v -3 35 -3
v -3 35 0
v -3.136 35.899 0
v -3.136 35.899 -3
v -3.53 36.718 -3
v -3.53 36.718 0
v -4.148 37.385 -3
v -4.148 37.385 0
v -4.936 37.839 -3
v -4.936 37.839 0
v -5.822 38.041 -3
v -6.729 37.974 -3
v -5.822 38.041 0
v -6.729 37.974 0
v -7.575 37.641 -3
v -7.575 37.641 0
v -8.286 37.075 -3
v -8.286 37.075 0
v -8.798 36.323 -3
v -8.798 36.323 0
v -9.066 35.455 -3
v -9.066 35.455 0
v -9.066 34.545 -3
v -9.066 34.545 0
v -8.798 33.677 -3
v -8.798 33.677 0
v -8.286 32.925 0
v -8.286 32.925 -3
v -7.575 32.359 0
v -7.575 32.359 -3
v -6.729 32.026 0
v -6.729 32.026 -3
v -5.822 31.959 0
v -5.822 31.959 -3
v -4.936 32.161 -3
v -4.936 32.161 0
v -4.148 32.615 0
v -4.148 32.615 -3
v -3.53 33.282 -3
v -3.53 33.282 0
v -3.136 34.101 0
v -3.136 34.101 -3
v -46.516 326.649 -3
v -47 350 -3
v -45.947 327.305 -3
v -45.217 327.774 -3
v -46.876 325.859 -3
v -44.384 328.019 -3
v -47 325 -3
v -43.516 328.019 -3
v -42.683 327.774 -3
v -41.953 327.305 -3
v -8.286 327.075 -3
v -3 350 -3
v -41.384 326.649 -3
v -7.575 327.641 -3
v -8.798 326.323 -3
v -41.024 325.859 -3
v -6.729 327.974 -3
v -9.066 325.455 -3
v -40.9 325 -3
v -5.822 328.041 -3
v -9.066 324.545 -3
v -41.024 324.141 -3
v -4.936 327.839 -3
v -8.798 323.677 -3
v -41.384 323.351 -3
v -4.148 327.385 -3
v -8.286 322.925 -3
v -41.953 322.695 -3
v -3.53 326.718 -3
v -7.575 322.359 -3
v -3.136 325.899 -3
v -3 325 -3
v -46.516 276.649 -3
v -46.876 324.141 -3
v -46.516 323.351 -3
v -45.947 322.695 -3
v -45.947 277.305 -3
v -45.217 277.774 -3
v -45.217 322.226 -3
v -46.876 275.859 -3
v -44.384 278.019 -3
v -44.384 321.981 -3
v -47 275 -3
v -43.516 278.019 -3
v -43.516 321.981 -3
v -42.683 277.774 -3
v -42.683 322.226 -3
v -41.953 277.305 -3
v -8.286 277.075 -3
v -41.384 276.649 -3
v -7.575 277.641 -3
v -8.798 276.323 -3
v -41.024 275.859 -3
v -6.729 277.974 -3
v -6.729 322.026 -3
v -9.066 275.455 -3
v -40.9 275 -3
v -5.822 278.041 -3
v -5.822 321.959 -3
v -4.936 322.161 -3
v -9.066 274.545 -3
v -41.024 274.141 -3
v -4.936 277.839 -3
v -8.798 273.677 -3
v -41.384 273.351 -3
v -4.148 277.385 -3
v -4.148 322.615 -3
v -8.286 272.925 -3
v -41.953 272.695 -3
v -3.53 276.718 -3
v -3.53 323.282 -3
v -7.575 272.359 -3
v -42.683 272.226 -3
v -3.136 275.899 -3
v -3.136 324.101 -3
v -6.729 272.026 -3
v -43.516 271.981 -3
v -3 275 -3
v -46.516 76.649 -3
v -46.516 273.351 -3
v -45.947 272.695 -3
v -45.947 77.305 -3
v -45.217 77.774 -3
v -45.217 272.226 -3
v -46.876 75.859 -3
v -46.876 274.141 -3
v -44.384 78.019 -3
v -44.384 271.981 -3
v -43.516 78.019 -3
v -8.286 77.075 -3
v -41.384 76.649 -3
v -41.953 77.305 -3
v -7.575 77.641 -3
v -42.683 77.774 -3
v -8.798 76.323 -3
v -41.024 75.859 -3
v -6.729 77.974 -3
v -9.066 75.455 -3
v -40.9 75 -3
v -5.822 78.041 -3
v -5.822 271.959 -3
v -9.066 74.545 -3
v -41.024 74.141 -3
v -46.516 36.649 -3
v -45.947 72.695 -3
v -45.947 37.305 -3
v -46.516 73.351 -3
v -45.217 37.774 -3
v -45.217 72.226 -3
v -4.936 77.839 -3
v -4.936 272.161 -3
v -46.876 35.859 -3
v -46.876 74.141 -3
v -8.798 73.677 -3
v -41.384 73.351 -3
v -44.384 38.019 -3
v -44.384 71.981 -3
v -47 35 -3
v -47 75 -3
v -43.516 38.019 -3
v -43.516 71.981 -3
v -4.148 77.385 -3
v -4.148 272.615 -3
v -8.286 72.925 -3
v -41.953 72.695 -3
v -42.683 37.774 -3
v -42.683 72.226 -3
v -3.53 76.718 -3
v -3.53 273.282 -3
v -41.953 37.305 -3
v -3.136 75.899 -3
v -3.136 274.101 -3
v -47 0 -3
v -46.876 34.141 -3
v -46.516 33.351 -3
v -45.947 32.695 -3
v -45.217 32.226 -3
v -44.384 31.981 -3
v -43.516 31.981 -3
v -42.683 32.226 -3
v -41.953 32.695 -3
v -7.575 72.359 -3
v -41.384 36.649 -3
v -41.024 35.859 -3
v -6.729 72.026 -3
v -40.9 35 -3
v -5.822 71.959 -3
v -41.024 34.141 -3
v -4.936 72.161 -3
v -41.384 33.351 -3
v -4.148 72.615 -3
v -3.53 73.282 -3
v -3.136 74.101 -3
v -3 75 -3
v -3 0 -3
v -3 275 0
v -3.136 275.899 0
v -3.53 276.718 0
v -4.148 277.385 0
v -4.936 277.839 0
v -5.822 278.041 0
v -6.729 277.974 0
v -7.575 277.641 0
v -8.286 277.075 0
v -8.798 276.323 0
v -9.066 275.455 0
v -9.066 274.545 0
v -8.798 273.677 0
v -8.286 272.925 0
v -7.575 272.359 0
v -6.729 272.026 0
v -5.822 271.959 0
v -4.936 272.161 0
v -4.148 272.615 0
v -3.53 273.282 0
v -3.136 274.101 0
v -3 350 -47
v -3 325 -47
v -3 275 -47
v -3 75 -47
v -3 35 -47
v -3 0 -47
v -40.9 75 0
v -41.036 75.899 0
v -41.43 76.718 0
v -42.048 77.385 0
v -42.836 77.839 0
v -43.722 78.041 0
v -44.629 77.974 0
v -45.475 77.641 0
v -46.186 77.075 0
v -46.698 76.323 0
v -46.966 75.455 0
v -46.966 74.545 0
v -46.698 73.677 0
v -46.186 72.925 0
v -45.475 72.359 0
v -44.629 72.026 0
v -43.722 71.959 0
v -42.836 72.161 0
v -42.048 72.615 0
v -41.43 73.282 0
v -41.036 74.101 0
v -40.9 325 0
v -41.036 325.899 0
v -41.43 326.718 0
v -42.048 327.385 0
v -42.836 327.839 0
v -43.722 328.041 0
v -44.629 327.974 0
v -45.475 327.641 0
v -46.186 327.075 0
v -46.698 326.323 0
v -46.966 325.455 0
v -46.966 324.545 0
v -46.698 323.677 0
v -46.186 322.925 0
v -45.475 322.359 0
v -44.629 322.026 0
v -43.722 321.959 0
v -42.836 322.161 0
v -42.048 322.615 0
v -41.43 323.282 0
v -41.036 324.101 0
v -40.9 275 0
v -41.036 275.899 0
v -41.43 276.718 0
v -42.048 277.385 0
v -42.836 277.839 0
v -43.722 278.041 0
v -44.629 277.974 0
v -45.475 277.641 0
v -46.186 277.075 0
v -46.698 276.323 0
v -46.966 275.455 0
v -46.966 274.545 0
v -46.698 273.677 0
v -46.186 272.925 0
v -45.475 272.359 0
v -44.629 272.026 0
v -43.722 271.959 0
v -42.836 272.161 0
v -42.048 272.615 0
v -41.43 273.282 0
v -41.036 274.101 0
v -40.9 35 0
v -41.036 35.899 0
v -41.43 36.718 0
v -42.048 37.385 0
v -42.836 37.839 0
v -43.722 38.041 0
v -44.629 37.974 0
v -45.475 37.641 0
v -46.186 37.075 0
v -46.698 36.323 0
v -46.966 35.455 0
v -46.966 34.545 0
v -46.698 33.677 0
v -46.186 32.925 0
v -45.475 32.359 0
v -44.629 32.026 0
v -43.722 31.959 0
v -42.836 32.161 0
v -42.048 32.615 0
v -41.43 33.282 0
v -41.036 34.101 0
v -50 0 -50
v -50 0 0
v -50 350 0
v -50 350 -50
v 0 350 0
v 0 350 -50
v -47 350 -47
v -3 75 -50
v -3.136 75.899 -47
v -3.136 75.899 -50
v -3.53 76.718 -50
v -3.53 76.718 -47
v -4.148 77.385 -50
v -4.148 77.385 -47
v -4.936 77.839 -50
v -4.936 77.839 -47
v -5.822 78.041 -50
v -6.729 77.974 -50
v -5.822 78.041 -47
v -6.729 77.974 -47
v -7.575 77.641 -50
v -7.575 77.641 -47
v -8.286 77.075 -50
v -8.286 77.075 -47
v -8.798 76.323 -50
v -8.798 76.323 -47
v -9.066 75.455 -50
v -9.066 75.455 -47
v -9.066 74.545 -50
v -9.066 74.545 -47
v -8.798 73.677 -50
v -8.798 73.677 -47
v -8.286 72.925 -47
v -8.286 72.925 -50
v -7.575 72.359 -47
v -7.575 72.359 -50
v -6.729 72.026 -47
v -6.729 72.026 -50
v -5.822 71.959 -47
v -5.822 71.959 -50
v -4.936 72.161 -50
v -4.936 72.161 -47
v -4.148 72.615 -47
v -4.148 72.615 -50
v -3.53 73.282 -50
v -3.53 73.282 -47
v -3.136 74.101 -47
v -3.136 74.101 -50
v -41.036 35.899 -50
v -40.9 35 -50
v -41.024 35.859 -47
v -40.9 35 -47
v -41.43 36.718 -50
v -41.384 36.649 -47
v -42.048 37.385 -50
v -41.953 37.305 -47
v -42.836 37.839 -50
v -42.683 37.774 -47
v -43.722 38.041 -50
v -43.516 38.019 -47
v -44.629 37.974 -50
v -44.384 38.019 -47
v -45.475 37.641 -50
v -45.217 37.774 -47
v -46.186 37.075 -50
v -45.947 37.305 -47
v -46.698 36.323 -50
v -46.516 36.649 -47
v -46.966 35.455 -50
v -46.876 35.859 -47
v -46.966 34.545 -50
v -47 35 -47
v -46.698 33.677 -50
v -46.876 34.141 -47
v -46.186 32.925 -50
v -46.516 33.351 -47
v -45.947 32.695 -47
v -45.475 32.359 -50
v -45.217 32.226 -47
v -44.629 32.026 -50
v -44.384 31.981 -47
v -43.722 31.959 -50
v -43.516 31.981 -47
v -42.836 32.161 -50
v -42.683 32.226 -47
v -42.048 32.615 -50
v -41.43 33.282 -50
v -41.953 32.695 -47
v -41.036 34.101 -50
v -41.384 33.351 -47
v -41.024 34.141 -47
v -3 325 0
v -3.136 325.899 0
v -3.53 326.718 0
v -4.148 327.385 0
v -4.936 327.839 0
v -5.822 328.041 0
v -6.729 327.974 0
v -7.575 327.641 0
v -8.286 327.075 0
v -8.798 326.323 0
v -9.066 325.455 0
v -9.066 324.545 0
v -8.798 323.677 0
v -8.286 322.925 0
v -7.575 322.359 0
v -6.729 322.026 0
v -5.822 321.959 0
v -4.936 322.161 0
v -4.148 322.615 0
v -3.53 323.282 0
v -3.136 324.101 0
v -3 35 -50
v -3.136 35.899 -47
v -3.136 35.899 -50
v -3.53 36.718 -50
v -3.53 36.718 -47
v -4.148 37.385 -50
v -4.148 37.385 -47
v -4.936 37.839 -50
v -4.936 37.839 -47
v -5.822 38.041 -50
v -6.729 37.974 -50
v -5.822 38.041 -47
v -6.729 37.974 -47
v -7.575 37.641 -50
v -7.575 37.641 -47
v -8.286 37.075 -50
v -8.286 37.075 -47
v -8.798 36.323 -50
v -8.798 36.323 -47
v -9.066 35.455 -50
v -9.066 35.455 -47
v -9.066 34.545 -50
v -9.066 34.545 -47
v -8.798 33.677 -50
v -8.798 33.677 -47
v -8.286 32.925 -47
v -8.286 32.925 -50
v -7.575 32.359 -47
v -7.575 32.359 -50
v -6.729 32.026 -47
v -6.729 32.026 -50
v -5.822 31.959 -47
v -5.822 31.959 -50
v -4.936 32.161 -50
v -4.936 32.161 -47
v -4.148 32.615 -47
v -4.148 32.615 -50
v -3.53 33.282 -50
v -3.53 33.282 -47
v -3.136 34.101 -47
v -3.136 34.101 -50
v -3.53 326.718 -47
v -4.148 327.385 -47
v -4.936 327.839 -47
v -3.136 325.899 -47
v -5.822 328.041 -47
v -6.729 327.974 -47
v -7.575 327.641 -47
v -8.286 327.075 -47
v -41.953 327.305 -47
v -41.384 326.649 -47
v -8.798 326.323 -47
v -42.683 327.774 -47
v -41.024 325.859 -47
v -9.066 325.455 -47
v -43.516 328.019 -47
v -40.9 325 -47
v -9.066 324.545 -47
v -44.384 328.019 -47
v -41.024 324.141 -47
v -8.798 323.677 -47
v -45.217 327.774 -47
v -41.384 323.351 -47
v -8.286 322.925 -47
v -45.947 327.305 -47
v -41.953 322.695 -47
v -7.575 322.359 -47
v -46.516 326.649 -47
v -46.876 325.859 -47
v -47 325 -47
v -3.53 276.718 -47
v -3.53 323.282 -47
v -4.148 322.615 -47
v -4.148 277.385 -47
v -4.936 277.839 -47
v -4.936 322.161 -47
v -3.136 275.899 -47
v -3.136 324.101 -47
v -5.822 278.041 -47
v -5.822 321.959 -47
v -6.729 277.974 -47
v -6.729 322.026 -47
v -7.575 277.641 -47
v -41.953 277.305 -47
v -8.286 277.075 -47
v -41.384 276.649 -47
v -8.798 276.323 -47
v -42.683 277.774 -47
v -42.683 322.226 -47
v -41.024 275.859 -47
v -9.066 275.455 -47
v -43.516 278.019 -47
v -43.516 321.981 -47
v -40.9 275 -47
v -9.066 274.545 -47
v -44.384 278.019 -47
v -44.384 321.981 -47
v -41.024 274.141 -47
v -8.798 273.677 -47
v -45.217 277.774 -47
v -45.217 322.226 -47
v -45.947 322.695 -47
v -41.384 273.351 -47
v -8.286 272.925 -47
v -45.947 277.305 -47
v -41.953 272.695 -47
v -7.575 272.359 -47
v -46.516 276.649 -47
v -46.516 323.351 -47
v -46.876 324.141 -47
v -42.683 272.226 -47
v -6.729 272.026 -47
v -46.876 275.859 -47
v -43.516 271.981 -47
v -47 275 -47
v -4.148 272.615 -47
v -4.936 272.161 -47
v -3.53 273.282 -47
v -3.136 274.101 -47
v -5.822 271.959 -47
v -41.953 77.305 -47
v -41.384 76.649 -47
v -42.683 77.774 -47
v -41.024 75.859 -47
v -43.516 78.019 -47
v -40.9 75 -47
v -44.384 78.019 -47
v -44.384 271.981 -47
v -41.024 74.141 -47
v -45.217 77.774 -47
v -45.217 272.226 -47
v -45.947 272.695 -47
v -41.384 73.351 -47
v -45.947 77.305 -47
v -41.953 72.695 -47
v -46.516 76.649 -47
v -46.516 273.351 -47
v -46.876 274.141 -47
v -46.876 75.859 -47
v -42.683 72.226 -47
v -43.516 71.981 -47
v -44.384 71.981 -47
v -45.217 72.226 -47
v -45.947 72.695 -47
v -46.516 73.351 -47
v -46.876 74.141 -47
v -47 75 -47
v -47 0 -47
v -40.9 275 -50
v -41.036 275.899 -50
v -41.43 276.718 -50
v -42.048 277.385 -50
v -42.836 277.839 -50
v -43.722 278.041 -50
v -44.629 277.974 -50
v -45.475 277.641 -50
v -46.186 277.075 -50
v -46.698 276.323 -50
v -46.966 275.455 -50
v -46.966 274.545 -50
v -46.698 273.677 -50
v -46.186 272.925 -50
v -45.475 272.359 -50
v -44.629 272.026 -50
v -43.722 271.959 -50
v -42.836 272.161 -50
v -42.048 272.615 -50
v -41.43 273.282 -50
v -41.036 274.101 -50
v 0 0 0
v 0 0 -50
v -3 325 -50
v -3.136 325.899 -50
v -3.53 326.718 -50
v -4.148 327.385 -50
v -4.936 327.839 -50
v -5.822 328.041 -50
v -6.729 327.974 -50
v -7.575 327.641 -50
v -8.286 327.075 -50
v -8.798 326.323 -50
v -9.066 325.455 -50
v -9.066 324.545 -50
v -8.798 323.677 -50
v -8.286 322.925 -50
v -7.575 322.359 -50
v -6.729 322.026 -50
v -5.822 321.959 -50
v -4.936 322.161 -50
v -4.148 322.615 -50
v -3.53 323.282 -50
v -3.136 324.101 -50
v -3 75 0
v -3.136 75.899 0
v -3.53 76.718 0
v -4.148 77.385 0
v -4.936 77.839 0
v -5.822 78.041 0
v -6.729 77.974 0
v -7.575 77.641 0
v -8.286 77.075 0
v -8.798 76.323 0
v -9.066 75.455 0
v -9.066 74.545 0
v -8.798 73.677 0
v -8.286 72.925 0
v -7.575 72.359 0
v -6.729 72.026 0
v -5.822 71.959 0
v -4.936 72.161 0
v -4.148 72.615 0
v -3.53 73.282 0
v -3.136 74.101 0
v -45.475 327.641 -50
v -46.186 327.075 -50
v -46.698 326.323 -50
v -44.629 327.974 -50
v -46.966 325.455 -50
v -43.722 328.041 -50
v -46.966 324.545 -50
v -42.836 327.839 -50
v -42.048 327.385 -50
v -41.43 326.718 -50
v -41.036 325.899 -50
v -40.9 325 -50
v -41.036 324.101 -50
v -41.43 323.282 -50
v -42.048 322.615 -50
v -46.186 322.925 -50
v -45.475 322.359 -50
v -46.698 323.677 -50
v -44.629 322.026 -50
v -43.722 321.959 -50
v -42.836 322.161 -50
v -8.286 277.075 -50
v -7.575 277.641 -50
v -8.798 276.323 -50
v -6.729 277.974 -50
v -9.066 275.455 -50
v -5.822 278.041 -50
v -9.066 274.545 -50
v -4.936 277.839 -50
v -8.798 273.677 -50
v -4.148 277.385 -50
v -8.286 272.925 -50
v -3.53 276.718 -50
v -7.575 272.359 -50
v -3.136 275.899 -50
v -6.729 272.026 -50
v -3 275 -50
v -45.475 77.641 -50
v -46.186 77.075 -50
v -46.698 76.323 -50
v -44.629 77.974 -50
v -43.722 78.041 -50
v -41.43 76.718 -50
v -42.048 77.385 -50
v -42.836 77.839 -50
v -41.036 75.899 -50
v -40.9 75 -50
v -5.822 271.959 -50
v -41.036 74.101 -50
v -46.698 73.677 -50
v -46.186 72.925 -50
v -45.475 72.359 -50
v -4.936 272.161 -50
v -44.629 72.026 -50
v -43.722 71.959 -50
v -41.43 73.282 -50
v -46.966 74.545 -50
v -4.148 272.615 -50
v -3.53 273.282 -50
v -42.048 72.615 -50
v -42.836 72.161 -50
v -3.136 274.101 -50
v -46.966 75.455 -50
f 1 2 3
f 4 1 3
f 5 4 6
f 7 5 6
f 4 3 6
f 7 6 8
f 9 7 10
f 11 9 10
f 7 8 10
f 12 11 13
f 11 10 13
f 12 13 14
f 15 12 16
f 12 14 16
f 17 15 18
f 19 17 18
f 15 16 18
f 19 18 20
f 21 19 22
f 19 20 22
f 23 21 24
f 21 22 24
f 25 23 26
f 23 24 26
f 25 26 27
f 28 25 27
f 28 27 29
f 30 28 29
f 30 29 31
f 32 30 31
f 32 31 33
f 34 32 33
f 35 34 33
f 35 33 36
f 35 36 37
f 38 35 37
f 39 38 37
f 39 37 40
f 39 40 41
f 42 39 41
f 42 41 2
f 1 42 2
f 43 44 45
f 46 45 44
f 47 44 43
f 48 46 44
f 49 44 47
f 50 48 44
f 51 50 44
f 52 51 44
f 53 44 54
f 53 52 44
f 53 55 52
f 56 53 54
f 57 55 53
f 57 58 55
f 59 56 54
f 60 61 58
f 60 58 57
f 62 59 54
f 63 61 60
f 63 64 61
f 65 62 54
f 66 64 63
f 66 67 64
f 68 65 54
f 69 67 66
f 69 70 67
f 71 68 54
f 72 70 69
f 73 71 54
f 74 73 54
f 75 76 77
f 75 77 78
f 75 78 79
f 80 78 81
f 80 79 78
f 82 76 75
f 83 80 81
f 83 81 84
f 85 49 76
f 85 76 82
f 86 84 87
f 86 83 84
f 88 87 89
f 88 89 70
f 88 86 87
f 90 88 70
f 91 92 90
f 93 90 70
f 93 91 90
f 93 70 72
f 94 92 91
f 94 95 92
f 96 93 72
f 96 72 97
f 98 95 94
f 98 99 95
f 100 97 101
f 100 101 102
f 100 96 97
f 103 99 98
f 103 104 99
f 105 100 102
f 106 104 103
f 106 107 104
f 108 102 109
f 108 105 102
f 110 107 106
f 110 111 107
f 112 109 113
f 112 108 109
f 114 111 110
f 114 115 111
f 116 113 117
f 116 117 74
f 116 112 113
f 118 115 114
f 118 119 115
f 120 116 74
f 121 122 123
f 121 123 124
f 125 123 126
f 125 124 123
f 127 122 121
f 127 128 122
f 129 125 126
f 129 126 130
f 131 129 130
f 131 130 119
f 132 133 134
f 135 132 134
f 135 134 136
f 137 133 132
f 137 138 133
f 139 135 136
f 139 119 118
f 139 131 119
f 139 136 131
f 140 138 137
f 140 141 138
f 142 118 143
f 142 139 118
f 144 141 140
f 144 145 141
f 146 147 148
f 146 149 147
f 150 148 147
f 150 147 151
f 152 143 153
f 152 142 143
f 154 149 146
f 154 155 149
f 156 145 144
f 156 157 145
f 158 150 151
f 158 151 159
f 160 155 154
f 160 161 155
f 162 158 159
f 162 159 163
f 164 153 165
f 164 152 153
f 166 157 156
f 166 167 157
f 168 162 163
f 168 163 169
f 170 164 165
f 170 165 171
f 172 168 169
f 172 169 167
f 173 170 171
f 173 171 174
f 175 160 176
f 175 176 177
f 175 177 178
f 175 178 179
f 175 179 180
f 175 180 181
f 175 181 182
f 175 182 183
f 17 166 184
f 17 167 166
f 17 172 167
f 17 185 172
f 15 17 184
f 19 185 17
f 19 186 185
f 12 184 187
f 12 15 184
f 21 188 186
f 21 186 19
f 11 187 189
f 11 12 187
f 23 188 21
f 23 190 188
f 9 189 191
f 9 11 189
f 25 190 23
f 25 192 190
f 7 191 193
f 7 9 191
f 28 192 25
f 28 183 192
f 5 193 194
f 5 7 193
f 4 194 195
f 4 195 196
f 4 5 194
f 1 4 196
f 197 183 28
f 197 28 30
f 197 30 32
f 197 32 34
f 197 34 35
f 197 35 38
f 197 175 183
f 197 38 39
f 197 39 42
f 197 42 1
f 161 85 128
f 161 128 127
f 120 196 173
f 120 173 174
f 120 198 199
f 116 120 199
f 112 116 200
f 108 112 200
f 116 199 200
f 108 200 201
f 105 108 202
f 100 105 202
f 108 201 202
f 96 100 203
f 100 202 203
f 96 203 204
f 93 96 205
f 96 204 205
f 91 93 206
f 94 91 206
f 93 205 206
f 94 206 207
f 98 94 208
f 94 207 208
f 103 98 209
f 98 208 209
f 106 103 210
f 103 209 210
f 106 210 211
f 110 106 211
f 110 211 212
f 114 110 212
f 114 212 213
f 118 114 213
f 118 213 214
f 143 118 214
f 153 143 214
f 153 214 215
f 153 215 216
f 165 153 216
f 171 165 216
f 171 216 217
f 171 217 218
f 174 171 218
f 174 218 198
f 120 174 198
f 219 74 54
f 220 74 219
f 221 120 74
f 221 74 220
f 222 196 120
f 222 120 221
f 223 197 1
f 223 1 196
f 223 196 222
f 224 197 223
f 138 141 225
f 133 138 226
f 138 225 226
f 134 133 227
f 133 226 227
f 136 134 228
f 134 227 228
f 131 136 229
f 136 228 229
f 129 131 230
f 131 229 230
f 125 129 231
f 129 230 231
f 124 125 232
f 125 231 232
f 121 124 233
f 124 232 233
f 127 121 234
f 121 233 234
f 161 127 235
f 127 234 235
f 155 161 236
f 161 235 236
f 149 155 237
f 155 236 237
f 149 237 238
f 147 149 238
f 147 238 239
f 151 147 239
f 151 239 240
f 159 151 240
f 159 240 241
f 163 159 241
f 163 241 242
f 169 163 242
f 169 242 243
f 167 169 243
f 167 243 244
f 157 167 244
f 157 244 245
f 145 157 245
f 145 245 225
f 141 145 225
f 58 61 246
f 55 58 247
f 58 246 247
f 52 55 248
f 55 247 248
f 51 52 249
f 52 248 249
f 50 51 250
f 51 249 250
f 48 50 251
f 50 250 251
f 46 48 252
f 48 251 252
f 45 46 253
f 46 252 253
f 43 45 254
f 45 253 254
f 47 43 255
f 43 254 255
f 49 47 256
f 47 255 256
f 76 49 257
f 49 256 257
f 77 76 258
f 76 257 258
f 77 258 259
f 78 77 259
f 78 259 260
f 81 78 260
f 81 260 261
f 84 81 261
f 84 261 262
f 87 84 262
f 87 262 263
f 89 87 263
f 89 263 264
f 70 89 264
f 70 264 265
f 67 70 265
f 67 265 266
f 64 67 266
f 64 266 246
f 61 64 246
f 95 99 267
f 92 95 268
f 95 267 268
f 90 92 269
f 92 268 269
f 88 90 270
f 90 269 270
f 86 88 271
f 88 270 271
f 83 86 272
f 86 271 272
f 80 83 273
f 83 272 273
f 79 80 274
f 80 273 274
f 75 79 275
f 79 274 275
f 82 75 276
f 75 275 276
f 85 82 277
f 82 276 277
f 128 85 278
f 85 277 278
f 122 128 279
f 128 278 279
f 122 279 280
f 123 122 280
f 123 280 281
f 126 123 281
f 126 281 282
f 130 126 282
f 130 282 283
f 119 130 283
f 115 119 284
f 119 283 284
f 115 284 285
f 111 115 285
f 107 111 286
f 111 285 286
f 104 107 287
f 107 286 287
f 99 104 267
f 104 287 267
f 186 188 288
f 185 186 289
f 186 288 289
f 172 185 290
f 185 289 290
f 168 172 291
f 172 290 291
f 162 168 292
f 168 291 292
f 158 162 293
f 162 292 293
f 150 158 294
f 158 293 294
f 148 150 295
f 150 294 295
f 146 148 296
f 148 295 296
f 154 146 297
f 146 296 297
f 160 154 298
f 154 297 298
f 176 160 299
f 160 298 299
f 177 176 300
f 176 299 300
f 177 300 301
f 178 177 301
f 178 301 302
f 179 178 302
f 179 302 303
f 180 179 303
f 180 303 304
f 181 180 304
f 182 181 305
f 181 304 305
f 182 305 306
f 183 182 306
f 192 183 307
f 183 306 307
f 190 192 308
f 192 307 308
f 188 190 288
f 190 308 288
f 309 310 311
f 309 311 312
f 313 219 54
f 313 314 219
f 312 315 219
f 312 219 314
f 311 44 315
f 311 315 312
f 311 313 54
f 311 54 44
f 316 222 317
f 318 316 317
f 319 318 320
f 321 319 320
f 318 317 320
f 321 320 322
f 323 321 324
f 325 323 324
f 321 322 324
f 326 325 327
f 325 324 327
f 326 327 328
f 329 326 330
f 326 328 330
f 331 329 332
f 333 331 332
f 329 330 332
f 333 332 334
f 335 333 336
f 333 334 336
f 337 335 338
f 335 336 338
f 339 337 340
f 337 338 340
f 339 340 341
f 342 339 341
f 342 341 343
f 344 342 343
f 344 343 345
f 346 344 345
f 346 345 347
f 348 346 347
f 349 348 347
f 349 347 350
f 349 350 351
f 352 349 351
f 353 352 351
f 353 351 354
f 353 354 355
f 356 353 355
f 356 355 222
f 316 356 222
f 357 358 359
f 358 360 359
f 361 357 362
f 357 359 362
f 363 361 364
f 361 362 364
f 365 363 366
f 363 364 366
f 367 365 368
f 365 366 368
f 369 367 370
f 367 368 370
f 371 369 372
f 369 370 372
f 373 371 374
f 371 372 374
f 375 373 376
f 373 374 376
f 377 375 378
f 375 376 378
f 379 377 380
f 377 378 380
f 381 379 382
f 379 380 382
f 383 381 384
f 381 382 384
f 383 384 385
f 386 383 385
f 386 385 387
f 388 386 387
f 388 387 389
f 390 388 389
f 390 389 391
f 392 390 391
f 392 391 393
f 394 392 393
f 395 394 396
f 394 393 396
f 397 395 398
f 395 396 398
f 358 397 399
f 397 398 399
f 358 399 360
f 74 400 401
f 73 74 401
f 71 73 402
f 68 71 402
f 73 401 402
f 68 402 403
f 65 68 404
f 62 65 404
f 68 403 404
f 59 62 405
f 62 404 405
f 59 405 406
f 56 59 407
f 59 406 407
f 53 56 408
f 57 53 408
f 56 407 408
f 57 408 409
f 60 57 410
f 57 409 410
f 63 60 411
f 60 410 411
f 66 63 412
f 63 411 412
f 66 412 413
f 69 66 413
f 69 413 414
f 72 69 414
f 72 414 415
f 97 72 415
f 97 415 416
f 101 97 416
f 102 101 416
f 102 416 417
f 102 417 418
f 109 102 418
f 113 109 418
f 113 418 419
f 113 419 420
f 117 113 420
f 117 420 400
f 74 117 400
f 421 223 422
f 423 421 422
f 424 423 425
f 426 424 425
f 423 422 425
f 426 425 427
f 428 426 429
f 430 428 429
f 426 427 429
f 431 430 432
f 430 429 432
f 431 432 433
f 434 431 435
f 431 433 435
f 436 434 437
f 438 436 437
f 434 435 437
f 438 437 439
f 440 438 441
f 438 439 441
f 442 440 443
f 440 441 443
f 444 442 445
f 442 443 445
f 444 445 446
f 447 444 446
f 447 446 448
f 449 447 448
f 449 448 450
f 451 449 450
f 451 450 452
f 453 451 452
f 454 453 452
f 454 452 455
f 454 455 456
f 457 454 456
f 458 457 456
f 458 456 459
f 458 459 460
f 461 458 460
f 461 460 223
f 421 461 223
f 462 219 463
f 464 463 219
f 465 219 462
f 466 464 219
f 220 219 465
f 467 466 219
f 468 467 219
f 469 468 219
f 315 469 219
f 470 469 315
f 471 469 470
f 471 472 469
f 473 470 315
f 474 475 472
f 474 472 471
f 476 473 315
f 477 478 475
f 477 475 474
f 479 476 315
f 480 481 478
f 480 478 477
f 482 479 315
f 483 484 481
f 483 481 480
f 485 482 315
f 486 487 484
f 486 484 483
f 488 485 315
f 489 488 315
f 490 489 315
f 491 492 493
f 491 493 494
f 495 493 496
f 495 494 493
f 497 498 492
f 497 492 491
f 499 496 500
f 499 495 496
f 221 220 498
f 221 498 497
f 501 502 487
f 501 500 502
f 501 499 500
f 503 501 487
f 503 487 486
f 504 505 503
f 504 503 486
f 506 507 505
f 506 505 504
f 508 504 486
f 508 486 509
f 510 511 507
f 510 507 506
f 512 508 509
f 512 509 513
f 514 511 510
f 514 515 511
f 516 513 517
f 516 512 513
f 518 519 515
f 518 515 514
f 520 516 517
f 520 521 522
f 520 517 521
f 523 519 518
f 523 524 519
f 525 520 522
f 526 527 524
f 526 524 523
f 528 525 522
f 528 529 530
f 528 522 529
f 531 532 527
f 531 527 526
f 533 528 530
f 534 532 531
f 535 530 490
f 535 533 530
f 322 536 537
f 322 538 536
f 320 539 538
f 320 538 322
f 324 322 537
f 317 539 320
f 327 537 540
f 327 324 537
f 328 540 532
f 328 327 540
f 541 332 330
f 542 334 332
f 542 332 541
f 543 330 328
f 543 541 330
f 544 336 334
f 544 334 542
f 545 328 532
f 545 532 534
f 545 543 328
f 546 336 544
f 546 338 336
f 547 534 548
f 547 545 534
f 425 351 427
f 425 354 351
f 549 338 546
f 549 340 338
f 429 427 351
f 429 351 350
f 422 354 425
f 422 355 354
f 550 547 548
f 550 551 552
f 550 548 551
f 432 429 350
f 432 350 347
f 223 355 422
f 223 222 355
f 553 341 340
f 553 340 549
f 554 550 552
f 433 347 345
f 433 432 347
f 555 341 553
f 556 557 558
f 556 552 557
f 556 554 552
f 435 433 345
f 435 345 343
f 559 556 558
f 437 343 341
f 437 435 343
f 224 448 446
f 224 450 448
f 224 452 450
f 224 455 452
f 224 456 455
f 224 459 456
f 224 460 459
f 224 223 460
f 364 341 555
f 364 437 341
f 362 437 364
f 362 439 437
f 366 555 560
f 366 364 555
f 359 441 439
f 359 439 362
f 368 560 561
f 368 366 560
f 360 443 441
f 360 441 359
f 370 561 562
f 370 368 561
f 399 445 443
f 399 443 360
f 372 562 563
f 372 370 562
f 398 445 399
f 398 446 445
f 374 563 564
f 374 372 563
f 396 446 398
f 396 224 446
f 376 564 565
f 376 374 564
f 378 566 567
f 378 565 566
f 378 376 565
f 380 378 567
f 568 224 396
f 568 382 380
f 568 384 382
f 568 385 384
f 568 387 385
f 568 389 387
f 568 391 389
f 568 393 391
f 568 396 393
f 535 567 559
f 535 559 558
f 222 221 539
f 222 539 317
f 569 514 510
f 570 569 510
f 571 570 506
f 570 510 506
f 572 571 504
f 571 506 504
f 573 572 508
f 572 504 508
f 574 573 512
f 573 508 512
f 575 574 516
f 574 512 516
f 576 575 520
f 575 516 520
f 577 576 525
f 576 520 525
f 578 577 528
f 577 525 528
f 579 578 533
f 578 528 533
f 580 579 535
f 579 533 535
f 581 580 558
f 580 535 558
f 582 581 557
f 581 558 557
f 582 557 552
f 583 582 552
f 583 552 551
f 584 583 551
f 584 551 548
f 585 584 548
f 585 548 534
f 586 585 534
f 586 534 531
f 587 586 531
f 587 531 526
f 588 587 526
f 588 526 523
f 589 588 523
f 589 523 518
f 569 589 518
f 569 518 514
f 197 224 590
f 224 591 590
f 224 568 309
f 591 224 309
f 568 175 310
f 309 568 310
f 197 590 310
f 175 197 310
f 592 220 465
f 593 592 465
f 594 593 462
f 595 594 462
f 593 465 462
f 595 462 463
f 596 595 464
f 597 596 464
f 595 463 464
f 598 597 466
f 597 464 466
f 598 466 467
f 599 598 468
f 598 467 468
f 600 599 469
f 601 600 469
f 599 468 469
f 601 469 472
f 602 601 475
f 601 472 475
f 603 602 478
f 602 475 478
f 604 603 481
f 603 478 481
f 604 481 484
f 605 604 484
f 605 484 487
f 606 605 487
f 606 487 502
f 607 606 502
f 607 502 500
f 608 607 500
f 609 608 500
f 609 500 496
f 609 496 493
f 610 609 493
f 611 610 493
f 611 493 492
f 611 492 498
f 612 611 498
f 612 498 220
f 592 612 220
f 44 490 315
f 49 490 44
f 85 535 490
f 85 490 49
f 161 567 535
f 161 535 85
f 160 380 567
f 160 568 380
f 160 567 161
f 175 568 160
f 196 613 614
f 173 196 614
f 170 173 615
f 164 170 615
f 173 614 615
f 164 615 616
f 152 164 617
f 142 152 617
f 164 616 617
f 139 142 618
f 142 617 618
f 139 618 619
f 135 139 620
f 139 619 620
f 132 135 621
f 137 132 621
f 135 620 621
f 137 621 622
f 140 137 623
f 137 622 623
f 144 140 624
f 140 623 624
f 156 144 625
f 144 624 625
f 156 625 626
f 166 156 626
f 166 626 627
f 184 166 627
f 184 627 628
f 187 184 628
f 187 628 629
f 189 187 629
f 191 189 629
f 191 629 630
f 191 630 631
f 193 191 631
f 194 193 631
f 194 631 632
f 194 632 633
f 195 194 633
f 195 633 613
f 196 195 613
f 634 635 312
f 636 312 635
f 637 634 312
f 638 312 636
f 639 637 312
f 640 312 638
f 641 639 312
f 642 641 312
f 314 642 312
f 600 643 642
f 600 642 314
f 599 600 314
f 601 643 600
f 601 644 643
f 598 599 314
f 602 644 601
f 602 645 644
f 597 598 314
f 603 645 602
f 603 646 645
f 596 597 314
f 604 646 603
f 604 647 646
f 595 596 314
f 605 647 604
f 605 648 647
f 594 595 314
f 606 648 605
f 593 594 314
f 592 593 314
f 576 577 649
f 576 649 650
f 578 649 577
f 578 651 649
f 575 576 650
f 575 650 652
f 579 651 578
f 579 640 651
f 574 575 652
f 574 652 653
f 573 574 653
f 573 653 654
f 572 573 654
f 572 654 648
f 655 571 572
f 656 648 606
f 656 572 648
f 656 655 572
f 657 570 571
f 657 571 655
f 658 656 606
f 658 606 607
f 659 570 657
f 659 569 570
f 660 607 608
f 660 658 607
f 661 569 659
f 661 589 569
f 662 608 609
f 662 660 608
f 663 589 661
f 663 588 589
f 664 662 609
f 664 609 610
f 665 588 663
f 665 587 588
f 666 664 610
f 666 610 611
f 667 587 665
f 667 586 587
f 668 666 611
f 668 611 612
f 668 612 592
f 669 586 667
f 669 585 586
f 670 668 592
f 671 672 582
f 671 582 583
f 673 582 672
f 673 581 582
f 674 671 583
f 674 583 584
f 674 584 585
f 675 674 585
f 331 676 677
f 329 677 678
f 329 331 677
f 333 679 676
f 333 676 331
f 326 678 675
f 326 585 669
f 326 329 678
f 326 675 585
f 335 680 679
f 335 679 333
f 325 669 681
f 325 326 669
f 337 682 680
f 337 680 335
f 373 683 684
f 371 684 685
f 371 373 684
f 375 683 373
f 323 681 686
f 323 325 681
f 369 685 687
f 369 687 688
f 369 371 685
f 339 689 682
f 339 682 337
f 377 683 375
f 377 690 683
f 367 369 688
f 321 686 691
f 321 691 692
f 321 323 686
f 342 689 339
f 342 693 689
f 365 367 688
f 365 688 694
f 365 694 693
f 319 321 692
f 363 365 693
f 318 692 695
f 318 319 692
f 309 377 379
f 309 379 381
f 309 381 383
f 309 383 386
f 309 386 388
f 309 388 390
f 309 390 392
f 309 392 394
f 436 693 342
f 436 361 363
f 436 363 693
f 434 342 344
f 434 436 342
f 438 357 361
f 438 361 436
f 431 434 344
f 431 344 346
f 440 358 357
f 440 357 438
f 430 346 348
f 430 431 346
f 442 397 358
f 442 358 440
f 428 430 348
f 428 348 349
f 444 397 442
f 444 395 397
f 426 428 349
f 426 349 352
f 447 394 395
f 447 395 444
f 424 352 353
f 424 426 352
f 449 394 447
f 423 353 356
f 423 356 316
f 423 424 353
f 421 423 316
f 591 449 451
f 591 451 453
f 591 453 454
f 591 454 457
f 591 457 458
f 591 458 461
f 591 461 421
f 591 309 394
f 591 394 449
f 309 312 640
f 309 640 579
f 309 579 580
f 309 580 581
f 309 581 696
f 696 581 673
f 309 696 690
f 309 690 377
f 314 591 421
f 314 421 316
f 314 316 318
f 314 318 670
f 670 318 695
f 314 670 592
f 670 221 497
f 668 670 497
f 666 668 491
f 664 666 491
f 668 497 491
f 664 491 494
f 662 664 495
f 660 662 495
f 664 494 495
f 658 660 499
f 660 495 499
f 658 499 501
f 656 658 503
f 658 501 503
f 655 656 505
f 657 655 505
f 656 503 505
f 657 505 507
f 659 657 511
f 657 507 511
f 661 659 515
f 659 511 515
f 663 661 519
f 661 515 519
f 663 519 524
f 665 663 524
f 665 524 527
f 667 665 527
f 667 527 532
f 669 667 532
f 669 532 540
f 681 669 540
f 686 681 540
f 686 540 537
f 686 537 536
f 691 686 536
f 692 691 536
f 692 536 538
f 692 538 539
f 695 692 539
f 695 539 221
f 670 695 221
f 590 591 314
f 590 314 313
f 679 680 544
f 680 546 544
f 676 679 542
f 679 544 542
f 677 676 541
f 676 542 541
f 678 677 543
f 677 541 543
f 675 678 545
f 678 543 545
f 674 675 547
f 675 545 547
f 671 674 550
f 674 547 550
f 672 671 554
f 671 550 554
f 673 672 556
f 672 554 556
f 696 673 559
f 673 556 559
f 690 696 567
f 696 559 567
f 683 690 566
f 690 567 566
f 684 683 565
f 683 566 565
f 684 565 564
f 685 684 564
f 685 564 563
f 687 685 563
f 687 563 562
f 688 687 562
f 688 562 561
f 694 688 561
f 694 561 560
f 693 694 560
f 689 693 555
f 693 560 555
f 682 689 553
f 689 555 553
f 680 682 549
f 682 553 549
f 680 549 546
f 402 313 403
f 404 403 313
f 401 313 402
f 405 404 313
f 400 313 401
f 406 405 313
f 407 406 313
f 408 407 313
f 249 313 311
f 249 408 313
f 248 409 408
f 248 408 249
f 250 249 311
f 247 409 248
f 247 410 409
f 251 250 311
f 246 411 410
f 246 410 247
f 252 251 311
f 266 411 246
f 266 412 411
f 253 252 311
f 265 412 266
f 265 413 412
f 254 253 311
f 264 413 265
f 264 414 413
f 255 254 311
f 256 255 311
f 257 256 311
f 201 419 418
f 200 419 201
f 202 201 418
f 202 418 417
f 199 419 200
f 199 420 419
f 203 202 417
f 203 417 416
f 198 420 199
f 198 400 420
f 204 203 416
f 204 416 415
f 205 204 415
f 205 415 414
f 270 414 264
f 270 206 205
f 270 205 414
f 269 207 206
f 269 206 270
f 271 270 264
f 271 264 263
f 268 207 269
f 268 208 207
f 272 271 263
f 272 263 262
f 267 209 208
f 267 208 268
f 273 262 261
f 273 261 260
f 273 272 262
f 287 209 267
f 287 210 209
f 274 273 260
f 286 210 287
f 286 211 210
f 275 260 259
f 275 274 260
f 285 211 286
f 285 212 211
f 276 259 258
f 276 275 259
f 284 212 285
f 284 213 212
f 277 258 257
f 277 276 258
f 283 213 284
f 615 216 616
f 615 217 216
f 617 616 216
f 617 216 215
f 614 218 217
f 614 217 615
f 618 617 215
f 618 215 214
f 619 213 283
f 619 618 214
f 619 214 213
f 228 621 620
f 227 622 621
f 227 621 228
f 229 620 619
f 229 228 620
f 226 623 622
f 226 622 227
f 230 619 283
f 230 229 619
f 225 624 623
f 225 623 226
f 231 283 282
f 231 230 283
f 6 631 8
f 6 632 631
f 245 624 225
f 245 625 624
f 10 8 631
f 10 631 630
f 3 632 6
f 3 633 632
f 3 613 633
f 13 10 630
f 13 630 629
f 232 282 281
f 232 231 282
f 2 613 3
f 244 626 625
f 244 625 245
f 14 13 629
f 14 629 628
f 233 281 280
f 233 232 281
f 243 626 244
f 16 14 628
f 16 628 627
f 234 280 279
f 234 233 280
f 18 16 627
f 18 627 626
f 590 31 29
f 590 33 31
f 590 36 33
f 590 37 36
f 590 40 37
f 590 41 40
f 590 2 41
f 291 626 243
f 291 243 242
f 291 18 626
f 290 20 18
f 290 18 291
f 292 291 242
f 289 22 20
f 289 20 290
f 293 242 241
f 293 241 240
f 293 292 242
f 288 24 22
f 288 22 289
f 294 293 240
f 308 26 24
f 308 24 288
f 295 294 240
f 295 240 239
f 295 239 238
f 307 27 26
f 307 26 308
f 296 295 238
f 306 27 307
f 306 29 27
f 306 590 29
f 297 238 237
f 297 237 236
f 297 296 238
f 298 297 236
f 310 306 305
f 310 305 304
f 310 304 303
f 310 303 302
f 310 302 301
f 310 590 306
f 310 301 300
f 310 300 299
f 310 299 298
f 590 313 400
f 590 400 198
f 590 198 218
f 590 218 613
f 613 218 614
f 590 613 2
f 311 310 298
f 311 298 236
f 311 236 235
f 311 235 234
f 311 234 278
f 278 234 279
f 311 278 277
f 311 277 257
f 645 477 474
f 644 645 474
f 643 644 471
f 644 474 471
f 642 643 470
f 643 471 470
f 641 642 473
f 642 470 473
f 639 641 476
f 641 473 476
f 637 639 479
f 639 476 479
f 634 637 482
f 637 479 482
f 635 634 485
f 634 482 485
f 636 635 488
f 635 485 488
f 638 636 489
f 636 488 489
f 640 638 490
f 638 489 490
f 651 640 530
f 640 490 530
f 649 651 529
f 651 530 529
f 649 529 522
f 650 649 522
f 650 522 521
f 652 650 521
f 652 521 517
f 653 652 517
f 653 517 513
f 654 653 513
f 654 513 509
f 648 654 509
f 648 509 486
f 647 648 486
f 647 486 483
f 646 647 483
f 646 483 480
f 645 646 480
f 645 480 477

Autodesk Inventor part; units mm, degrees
ref_plane "YZ Plane" through (0, 0, 0) normal (1, 0, 0) x (0, 1, 0)
ref_plane "XZ Plane" through (0, 0, 0) normal (0, 1, 0) x (-1, 0, 0)
ref_plane "XY Plane" through (0, 0, 0) normal (0, 0, 1) x (1, 0, 0)
sketch "Эскиз1" plane through (0, 0, 0) normal (0, 1, 0) x (-1, 0, 0)
  line L0 (0, 0) -> (50, 0)
  line L1 (50, 0) -> (50, -50)
  line L2 (50, -50) -> (0, -50)
  line L3 (0, -50) -> (0, 0)
  line L4 (3, -47) -> (47, -47)
  line L5 (47, -47) -> (47, -3)
  line L6 (47, -3) -> (3, -3)
  line L7 (3, -3) -> (3, -47)
  dimension "d0" = 50
  dimension "d1" = 50
  dimension "d2" = 3
extrude "Выдавливание1" add sketch "Эскиз1" along normal blind 350
sketch "Эскиз2" plane through (-50, 0, 0) normal (0, 0, 1) x (1, 0, 0)
  line L0 (0, 0) -> (50, 0) projected
  line L1 (50, 0) -> (50, 350) projected
  line L2 (0, 350) -> (50, 350) projected
  line L3 (0, 0) -> (0, 350) projected
  circle A0 centre (43.95, 325) radius 3.05
  circle A1 centre (43.95, 275) radius 3.05
  circle A2 centre (6.05, 325) radius 3.05
  circle A3 centre (6.05, 275) radius 3.05
  line L4 (3, 0) -> (47, 0) projected
  line L5 (47, 0) -> (47, 350) projected
  line L6 (3, 350) -> (47, 350) projected
  line L7 (3, 0) -> (3, 350) projected
  circle A4 centre (6.05, 35) radius 3.05
  circle A5 centre (43.95, 35) radius 3.05
  circle A6 centre (43.95, 75) radius 3.05
  circle A7 centre (6.05, 75) radius 3.05
  dimension "d5" = 6.1
  dimension "d8" = 50
  dimension "d11" = 37.9
  dimension "d14" = 25
  dimension "d15" = 6.05
  dimension "d18" = 6.1
  dimension "d19" = 35
  dimension "d22" = 40
extrude "Выдавливание2" cut sketch "Эскиз2" against normal through all contours A5 | A6 | A1 | A0 | A2 | A3 | A7 | A4
equation "\"d0\" = width_profile_femur"
equation "\"d1\" = hight_profile_femur"
equation "\"d2\" = thickness_profile_femur"
equation "\"d3\" = length_profile_femur"
equation "\"d5\" = d_main_screw_holes"
equation "\"d11\" = -2 * thickness_profile_femur + hight_profile_femur - d_main_screw_holes"
equation "\"d15\" = 0.5 * d_main_screw_holes + thickness_profile_femur"
equation "\"d18\" = d_main_screw_holes"
equation "\"tolerance_plazma\" = 0.1"
equation "\"thickness_steel\" = 3"
equation "\"d_main_screw_holes\" = 6.1"
equation "\"thickness_profile_tibea\" = 3"
equation "\"hight_shaft_shift\" = 37"
equation "\"thickness_profile_femur\" = 3"
equation "\"width_profile_femur\" = 50"
equation "\"width_shaft_shift\" = 35"
equation "\"length_profile_femur\" = 350"
equation "\"hight_profile_femur\" = 50"
equation "\"width_flattened_surface\" = 12"
properties part number "femur_profile"
